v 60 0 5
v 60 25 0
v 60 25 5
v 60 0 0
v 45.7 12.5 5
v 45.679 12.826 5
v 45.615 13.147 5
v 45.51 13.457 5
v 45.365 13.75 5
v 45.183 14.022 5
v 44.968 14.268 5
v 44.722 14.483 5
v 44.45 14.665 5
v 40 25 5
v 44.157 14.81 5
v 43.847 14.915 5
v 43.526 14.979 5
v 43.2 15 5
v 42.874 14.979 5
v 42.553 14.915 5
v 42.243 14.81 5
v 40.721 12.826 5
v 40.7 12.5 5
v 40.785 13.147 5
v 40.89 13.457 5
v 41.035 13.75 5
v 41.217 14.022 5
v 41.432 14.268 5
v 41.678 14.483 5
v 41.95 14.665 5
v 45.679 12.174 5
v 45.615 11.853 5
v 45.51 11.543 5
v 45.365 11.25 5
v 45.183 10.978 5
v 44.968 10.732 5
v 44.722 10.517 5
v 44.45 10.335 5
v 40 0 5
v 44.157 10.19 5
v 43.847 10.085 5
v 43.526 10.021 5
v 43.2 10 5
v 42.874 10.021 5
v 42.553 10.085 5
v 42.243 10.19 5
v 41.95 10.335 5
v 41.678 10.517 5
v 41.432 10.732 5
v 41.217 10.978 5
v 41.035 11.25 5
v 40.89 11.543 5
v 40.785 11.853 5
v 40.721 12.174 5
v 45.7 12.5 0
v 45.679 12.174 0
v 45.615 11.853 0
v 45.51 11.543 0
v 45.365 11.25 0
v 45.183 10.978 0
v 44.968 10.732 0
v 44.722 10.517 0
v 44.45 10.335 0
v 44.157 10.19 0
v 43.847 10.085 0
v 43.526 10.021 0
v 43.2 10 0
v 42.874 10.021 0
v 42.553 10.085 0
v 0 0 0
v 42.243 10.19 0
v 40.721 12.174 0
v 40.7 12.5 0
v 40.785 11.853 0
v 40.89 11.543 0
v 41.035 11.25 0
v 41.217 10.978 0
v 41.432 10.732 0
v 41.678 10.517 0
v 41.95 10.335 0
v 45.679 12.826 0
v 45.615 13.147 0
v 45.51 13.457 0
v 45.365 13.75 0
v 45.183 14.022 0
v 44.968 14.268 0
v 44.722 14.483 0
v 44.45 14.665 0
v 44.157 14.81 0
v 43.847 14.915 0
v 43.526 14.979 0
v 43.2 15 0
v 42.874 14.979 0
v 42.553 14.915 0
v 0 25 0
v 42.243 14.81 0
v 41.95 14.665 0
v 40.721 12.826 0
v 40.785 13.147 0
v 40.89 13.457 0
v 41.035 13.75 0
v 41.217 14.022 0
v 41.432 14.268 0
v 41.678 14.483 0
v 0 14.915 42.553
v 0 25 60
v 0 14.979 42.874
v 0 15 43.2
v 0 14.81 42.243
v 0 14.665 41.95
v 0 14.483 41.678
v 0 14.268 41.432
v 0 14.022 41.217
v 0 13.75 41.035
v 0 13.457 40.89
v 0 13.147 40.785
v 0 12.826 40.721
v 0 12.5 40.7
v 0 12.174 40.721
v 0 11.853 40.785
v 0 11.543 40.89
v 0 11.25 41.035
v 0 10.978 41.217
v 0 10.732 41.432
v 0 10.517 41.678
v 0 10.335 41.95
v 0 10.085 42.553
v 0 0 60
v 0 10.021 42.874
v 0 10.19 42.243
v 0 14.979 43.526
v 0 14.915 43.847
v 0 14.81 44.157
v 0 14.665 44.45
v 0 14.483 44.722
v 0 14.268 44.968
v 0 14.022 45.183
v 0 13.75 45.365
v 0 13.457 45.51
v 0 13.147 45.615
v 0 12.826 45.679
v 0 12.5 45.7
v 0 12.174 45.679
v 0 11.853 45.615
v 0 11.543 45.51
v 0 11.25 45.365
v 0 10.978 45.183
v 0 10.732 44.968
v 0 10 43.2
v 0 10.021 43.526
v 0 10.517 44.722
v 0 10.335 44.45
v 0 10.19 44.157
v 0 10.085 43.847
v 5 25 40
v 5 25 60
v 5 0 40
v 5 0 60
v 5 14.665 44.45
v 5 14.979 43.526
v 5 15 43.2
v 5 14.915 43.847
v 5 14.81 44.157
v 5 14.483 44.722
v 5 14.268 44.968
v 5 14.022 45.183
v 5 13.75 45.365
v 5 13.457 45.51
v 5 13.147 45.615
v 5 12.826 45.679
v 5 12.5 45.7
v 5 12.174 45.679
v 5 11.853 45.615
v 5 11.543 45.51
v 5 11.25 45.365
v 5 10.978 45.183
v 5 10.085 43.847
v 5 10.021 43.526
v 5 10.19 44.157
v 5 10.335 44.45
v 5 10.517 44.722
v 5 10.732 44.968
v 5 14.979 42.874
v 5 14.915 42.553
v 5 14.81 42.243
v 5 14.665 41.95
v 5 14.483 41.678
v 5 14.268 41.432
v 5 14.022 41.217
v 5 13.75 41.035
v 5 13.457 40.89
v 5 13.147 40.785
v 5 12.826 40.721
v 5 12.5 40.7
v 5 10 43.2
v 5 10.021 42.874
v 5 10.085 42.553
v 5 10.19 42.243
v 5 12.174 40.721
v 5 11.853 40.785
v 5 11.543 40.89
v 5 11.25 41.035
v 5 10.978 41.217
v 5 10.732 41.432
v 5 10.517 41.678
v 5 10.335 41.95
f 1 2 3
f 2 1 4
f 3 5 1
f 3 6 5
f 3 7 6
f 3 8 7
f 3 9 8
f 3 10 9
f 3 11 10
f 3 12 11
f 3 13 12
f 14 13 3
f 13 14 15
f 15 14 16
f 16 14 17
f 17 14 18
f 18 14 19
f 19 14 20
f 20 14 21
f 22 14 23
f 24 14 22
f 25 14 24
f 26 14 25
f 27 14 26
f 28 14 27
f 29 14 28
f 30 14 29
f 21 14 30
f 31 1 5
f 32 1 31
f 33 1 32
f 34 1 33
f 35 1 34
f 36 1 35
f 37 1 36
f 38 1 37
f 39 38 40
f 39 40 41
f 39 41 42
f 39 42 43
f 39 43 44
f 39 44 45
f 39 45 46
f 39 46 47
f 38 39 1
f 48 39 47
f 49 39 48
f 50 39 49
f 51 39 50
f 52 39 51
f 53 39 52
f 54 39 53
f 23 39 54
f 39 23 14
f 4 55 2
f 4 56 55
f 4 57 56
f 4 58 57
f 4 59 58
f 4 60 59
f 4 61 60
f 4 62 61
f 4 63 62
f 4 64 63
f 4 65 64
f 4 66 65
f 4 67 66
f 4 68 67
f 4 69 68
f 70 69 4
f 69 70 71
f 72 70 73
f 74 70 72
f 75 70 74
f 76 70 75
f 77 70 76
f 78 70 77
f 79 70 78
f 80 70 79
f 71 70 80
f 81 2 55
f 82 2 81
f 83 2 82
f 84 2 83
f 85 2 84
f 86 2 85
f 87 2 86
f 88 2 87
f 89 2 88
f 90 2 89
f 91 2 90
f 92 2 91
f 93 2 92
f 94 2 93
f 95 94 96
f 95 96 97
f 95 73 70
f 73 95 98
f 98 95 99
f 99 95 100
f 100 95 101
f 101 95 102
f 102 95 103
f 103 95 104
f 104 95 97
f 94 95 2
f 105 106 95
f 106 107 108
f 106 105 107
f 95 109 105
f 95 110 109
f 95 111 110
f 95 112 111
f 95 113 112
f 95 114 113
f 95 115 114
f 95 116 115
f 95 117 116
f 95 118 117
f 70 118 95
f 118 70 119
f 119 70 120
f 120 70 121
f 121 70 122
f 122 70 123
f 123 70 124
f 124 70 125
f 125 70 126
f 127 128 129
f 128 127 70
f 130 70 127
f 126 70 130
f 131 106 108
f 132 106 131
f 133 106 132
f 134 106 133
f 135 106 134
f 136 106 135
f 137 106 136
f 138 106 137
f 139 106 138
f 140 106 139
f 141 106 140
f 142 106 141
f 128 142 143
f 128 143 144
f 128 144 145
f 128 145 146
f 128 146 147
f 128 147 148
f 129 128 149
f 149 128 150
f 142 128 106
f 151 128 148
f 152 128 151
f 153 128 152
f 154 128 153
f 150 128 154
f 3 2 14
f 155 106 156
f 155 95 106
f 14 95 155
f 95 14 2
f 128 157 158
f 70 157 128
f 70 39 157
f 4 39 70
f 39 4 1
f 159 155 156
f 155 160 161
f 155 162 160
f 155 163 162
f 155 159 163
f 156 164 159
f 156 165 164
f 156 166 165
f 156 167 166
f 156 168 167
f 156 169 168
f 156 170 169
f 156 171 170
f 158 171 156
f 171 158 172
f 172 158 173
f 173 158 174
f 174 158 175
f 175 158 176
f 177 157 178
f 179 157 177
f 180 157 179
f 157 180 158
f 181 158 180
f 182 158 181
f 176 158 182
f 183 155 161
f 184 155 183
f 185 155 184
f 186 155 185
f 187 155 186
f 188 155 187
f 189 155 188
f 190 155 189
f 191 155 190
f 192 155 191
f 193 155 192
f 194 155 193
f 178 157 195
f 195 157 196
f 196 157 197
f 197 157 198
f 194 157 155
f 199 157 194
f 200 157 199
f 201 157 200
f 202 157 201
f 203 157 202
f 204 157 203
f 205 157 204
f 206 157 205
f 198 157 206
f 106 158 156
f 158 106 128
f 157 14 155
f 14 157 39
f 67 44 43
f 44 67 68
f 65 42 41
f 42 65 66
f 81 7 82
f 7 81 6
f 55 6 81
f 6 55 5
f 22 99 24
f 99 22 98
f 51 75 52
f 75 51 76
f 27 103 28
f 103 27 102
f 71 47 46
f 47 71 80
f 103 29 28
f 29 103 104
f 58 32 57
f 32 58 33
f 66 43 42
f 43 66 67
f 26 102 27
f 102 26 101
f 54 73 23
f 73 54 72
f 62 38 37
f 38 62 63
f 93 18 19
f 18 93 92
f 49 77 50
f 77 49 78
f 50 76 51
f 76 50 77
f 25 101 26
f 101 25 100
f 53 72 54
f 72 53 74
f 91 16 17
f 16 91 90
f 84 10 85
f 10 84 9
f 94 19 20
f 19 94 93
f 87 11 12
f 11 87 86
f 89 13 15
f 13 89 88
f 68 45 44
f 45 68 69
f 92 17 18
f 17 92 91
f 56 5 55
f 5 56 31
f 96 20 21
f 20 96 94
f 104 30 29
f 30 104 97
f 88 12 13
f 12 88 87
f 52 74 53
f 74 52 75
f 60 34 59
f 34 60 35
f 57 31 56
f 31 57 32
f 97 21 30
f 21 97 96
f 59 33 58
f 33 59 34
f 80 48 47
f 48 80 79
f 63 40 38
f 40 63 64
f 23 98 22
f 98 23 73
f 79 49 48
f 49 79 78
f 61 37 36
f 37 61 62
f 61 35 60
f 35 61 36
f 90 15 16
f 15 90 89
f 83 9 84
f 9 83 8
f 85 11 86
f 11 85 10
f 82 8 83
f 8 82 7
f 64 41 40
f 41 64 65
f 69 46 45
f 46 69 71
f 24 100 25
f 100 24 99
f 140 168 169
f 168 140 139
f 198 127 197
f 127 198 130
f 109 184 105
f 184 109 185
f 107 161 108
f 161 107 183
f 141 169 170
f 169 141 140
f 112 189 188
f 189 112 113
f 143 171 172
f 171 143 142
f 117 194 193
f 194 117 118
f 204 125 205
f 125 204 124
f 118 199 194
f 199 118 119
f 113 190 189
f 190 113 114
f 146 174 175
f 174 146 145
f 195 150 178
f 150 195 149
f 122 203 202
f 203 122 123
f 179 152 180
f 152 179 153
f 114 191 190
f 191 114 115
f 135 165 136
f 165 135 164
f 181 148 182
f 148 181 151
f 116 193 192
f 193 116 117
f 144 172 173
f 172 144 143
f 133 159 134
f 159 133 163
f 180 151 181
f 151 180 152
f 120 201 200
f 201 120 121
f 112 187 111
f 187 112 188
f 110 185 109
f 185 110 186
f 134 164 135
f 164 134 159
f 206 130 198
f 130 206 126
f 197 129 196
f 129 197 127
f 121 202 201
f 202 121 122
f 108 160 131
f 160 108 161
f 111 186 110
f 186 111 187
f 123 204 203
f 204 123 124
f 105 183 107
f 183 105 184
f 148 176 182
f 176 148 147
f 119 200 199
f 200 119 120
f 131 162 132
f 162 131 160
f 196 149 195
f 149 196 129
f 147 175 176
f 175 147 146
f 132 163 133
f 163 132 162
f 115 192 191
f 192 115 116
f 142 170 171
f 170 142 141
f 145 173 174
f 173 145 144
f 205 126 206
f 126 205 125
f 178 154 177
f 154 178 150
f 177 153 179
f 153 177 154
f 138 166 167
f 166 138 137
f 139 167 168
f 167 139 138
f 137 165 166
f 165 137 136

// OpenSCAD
// Shelf bracket - two perpendicular arms with a diagonal brace and a mounting hole in each
// arm. NOVEL general structural part.
//
// @desc right-angle shelf bracket with a diagonal brace
// @prompt Design a shelf bracket in OpenSCAD: two arms at a right angle, each {arm} mm long and {wide} mm wide and {t} mm thick, with a triangular brace between them and a {screw} mm hole near each arm end. Reply with a single complete OpenSCAD file.
// @param arm   arm length, mm       [30:100]
// @param wide  width, mm            [15:40]
// @param t     thickness, mm        [3:8]
// @param screw hole diameter, mm    [3:8]

arm   = 60;
wide  = 25;
t     = 5;
screw = 5;

$fn = 48;

g  = arm * 0.7;         // brace leg length
ov = min(t * 0.6, 2);   // dig the brace into both arms so the union is manifold (no coplanar faces)

difference() {
    union() {
        cube([arm, wide, t]);          // horizontal arm
        cube([t, wide, arm]);          // vertical arm
        translate([0, wide, 0]) rotate([90, 0, 0])
            linear_extrude(wide) polygon([[t - ov, t - ov], [g, t - ov], [t - ov, g]]);   // diagonal brace
    }
    translate([arm * 0.72, wide / 2, -1]) cylinder(h = t + 2, d = screw);
    translate([-1, wide / 2, arm * 0.72]) rotate([0, 90, 0]) cylinder(h = t + 2, d = screw);
}
